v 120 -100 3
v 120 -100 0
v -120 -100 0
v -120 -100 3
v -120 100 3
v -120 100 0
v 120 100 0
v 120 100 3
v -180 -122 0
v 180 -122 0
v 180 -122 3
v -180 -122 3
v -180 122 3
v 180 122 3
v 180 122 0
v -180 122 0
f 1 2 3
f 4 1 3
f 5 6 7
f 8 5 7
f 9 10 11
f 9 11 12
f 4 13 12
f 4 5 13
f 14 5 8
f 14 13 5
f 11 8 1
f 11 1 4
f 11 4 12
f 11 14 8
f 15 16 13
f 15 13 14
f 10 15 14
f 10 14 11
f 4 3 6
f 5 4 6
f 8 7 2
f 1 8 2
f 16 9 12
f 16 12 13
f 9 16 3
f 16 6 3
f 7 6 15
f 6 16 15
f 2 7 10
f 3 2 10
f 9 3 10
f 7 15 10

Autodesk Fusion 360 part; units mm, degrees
sketch "Sketch1" plane through (0, 0, 0) normal (0, 0, 1) x (1, 0, 0)
  line L0 (-180, 122) -> (180, 122)
  line L1 (180, 122) -> (180, -122)
  line L2 (180, -122) -> (-180, -122)
  line L3 (-180, -122) -> (-180, 122)
  line L4 (-180, 122) -> (180, -122) construction
  line L5 (180, 122) -> (-180, -122) construction
  line L6 (-150, 100) -> (150, 100)
  line L7 (150, 100) -> (150, -100)
  line L8 (150, -100) -> (-150, -100)
  line L9 (-150, -100) -> (-150, 100)
  line L10 (-150, 100) -> (150, -100) construction
  line L11 (150, 100) -> (-150, -100) construction
  dimension "d1" = 244
  dimension "d2" = 360
  dimension "d3" = 300
  dimension "d4" = 200
extrude "Extrude1" add sketch "Sketch1" along normal blind 3
extrude "Extrude2" add 1 faces at (-150, -33.3333, 1) along direction (1, 0, 0) blind 30
extrude "Extrude3" add 1 faces at (150, 33.3333, 1) along direction (-1, 0, 0) blind 30
sketch "Sketch2" plane through (0, 0, 3) normal (0, 0, 1) x (-1, 0, 0)
  line L0 (-120, 100) -> (120, 100)
  line L1 (120, 100) -> (120, -100)
  line L2 (120, -100) -> (-120, -100)
  line L3 (-120, -100) -> (-120, 100)
  line L4 (180, 122) -> (-180, 122)
  line L5 (-180, 122) -> (-180, -122)
  line L6 (-180, -122) -> (180, -122)
  line L7 (180, -122) -> (180, 122)
